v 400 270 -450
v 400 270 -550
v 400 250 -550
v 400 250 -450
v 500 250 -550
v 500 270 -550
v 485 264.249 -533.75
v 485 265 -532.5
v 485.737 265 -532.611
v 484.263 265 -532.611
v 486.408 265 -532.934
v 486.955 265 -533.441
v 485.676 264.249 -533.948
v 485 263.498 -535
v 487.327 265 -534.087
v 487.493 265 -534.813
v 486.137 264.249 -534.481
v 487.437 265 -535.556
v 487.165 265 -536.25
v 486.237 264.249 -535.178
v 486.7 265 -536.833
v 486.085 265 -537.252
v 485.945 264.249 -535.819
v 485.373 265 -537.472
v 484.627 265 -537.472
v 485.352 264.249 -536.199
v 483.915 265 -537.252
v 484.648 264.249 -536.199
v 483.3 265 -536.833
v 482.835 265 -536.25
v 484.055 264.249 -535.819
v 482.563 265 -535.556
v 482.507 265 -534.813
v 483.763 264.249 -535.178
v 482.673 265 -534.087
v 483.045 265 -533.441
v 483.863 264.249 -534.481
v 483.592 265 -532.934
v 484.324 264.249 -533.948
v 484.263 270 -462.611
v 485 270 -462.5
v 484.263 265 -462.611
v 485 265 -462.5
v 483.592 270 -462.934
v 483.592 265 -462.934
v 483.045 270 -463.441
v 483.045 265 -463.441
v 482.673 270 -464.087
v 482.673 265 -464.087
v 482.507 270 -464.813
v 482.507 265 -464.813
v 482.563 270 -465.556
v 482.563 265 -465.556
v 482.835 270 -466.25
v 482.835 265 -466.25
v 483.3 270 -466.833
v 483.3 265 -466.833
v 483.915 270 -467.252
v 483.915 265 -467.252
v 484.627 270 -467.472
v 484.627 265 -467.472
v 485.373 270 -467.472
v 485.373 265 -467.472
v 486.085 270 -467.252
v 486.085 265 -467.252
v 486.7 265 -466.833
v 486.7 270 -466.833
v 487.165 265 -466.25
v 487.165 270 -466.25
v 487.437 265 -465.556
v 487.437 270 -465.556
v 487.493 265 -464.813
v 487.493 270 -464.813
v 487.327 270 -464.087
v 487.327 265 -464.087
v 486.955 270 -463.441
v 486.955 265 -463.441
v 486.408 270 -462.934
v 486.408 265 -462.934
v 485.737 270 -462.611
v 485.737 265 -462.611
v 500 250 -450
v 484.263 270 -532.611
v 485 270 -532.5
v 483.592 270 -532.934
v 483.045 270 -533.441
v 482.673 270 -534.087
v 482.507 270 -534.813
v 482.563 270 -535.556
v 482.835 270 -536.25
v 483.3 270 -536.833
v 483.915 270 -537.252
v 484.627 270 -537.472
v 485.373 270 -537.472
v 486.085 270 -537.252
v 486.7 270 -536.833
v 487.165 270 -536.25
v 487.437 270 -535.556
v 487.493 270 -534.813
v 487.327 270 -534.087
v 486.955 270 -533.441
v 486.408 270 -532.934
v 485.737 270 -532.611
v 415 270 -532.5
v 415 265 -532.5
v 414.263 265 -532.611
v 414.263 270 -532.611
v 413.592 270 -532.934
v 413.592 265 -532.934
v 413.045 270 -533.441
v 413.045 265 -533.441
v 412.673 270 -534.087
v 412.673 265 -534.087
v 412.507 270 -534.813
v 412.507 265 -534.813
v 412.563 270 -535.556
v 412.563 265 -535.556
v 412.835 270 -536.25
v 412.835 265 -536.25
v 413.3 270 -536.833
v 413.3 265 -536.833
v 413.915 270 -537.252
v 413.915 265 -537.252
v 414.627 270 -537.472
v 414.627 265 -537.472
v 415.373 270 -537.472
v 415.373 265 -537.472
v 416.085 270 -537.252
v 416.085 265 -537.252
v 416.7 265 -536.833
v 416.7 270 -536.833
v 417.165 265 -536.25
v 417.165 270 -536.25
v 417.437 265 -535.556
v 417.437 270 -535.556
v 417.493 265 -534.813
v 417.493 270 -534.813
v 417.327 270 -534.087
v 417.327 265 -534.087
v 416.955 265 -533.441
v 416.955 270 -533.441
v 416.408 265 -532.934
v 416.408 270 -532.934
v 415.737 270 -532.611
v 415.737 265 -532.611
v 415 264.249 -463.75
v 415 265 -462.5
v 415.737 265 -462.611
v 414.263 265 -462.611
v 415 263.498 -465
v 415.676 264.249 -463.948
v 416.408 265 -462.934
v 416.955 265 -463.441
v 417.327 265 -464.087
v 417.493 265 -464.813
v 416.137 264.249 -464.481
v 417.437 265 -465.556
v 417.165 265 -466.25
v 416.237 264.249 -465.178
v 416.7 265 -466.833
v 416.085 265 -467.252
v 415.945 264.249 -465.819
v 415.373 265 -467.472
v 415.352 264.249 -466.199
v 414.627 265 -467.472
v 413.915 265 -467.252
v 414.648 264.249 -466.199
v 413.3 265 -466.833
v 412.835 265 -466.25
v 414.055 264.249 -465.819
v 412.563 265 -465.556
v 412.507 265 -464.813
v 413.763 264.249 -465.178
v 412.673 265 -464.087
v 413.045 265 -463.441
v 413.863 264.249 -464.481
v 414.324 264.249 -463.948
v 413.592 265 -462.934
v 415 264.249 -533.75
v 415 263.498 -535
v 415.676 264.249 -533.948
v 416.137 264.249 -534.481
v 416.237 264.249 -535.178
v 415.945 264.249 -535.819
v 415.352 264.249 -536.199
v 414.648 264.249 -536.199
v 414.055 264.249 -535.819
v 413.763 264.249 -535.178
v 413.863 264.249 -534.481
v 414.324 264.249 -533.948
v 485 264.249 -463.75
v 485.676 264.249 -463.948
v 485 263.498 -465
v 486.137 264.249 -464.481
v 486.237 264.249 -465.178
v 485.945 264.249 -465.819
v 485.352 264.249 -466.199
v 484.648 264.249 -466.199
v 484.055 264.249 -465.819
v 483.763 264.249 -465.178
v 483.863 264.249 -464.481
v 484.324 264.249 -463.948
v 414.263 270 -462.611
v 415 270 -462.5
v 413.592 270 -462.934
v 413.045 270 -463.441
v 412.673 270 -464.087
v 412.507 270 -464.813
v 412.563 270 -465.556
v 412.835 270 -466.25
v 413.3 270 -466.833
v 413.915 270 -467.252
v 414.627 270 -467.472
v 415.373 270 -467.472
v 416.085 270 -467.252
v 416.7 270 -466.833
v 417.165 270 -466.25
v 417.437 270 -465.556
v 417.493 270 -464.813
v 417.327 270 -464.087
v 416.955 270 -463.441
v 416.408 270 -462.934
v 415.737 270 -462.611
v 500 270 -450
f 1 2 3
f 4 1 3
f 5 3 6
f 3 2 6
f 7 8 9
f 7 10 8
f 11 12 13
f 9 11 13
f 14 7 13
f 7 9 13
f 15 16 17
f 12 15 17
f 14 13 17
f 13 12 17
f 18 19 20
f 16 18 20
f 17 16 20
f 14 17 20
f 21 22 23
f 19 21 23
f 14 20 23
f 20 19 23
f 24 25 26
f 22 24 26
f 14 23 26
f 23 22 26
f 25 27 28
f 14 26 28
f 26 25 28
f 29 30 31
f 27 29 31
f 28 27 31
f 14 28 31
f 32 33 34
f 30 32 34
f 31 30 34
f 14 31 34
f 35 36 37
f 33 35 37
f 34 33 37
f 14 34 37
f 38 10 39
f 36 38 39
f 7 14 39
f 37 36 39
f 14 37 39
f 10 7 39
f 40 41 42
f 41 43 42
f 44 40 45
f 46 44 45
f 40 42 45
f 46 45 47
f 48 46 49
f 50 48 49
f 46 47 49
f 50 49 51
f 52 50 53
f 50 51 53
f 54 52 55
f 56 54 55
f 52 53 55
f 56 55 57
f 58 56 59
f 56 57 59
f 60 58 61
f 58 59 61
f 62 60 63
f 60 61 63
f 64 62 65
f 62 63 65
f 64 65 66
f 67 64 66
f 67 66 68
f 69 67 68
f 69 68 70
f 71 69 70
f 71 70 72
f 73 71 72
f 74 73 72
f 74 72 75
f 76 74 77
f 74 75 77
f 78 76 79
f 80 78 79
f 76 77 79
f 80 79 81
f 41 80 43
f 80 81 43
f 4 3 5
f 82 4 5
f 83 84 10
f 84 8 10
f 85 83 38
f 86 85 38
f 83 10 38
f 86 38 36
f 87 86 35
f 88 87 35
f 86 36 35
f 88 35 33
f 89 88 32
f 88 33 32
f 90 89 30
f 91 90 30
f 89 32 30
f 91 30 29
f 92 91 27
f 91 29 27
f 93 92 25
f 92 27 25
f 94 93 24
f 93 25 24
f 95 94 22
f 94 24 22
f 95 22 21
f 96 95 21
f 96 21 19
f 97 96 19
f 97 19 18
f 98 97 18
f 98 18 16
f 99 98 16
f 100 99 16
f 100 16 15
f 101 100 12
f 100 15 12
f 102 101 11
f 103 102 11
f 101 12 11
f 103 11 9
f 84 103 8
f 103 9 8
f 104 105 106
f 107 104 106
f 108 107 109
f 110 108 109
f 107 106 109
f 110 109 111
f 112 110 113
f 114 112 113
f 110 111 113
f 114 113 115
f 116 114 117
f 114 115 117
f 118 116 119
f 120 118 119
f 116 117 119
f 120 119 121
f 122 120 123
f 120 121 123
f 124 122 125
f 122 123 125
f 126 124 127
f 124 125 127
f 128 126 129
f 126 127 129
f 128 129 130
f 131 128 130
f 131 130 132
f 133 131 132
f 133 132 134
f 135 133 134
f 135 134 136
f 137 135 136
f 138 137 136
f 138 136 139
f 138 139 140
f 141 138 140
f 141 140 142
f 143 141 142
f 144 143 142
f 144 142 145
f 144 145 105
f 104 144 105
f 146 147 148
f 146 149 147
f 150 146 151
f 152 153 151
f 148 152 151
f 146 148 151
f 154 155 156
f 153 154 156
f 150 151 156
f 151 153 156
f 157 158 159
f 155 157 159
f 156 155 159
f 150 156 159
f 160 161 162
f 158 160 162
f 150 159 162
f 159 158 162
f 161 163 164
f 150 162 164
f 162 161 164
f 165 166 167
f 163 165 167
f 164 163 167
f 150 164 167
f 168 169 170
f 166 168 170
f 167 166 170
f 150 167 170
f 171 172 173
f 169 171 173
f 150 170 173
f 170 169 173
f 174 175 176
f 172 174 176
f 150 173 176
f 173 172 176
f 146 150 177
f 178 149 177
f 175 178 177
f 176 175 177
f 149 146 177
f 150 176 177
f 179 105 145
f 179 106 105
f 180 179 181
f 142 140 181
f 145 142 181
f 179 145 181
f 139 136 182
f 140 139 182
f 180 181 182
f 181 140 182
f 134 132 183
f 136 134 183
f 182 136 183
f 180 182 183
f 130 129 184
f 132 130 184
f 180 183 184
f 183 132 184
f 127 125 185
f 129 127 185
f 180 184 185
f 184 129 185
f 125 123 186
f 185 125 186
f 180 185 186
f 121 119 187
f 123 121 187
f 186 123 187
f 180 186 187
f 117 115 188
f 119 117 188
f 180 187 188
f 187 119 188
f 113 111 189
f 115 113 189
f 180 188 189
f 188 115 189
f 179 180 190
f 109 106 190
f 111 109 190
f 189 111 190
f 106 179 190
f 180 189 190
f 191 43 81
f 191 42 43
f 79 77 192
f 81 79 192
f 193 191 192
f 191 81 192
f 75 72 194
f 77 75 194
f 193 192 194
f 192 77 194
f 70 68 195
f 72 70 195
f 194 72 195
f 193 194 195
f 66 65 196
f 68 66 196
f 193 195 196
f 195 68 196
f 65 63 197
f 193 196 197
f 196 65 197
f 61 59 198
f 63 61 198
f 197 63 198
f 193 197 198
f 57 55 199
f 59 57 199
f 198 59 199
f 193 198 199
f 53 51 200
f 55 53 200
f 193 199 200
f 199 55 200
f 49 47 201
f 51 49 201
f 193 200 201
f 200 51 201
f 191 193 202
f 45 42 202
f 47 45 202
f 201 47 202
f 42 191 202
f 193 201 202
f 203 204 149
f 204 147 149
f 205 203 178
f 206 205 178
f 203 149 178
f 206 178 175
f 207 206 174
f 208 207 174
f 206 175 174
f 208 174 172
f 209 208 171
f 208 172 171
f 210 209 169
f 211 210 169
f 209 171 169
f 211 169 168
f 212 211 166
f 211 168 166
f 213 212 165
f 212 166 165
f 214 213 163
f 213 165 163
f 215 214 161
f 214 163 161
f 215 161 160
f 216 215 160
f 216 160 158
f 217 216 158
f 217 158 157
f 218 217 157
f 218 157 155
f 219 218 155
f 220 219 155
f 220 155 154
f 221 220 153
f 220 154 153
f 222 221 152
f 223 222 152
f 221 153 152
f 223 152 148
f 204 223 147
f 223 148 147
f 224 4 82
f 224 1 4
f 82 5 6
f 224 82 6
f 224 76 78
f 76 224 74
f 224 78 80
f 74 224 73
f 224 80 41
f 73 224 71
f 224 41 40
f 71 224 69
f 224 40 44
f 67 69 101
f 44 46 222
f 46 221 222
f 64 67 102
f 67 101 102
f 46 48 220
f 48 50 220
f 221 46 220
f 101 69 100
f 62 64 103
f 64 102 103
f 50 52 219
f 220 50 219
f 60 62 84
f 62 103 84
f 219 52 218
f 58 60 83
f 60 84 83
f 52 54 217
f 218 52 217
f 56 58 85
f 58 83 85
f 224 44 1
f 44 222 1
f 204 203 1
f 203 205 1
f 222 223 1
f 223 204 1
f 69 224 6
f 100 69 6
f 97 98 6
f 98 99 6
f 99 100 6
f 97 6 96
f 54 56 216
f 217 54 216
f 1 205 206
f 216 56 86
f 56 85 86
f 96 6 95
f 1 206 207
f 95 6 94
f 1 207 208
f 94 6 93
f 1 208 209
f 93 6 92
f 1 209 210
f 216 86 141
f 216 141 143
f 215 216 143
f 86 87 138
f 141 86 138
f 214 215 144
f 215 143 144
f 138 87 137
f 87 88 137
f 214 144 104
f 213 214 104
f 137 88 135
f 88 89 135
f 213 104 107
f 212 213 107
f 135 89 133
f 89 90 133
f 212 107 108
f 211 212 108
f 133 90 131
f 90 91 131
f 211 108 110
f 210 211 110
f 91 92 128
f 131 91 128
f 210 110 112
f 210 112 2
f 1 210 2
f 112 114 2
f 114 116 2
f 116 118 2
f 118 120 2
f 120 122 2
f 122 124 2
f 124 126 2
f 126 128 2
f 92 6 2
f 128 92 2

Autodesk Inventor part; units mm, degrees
ref_plane "YZ Plane" through (0, 0, 0) normal (1, 0, 0) x (0, 1, 0)
ref_plane "XZ Plane" through (0, 0, 0) normal (0, 1, 0) x (-1, 0, 0)
ref_plane "Plano de trabajo2" through (0, 0, -500) normal (0, 0, 1) x (1, 0, 0)
sketch "Boceto2" plane through (0, 0, -500) normal (0, 0, 1) x (1, 0, 0)
  line L0 (400, 250) -> (500, 250)
  line L1 (500, 250) -> (500, 270)
  line L2 (500, 270) -> (400, 270)
  line L3 (400, 270) -> (400, 250)
  line L4 (150, 50) -> (150, 550) projected
  line L5 (0, 50) -> (1000, 50) projected
  line L6 (850, 50) -> (850, 550) projected
  point P0 (0, 0)
  dimension "d4" = 100
  dimension "d5" = 20
  dimension "d6" = 250
  dimension "d7" = 200
  dimension "d8" = 350
extrude "Extrusión1" add sketch "Boceto2" along normal blind 50 and the other way blind 50
sketch "Boceto3" plane through (400, 270, -450) normal (0, 1, 0) x (1, 0, 0)
  circle A0 centre (15, 15) radius 2.5
  circle A1 centre (15, 85) radius 2.5
  circle A2 centre (85, 85) radius 2.5
  circle A3 centre (85, 15) radius 2.5
  line L0 (0, 100) -> (0, 0) projected
  line L1 (100, 100) -> (100, 0) projected
  line L2 (0, 100) -> (100, 100) projected
  line L3 (100, 0) -> (0, 0) projected
  point P0 (-400, -450)
  dimension "d13" = 5
  dimension "d14" = 5
  dimension "d15" = 5
  dimension "d16" = 5
  dimension "d17" = 15
  dimension "d18" = 15
  dimension "d19" = 15
  dimension "d20" = 15
  dimension "d21" = 15
  dimension "d22" = 15
  dimension "d23" = 15
  dimension "d24" = 15
hole "Agujero1" at (485, 270, -465) direction (0, -1, 0) diameter 5 depth 5 tip angle 118
hole "Agujero2" at (415, 270, -465) direction (0, -1, 0) diameter 5 depth 5 tip angle 118
hole "Agujero3" at (415, 270, -535) direction (0, -1, 0) diameter 5 depth 5 tip angle 118
hole "Agujero4" at (485, 270, -535) direction (0, -1, 0) diameter 5 depth 5 tip angle 118
properties part number "Plataforma"
